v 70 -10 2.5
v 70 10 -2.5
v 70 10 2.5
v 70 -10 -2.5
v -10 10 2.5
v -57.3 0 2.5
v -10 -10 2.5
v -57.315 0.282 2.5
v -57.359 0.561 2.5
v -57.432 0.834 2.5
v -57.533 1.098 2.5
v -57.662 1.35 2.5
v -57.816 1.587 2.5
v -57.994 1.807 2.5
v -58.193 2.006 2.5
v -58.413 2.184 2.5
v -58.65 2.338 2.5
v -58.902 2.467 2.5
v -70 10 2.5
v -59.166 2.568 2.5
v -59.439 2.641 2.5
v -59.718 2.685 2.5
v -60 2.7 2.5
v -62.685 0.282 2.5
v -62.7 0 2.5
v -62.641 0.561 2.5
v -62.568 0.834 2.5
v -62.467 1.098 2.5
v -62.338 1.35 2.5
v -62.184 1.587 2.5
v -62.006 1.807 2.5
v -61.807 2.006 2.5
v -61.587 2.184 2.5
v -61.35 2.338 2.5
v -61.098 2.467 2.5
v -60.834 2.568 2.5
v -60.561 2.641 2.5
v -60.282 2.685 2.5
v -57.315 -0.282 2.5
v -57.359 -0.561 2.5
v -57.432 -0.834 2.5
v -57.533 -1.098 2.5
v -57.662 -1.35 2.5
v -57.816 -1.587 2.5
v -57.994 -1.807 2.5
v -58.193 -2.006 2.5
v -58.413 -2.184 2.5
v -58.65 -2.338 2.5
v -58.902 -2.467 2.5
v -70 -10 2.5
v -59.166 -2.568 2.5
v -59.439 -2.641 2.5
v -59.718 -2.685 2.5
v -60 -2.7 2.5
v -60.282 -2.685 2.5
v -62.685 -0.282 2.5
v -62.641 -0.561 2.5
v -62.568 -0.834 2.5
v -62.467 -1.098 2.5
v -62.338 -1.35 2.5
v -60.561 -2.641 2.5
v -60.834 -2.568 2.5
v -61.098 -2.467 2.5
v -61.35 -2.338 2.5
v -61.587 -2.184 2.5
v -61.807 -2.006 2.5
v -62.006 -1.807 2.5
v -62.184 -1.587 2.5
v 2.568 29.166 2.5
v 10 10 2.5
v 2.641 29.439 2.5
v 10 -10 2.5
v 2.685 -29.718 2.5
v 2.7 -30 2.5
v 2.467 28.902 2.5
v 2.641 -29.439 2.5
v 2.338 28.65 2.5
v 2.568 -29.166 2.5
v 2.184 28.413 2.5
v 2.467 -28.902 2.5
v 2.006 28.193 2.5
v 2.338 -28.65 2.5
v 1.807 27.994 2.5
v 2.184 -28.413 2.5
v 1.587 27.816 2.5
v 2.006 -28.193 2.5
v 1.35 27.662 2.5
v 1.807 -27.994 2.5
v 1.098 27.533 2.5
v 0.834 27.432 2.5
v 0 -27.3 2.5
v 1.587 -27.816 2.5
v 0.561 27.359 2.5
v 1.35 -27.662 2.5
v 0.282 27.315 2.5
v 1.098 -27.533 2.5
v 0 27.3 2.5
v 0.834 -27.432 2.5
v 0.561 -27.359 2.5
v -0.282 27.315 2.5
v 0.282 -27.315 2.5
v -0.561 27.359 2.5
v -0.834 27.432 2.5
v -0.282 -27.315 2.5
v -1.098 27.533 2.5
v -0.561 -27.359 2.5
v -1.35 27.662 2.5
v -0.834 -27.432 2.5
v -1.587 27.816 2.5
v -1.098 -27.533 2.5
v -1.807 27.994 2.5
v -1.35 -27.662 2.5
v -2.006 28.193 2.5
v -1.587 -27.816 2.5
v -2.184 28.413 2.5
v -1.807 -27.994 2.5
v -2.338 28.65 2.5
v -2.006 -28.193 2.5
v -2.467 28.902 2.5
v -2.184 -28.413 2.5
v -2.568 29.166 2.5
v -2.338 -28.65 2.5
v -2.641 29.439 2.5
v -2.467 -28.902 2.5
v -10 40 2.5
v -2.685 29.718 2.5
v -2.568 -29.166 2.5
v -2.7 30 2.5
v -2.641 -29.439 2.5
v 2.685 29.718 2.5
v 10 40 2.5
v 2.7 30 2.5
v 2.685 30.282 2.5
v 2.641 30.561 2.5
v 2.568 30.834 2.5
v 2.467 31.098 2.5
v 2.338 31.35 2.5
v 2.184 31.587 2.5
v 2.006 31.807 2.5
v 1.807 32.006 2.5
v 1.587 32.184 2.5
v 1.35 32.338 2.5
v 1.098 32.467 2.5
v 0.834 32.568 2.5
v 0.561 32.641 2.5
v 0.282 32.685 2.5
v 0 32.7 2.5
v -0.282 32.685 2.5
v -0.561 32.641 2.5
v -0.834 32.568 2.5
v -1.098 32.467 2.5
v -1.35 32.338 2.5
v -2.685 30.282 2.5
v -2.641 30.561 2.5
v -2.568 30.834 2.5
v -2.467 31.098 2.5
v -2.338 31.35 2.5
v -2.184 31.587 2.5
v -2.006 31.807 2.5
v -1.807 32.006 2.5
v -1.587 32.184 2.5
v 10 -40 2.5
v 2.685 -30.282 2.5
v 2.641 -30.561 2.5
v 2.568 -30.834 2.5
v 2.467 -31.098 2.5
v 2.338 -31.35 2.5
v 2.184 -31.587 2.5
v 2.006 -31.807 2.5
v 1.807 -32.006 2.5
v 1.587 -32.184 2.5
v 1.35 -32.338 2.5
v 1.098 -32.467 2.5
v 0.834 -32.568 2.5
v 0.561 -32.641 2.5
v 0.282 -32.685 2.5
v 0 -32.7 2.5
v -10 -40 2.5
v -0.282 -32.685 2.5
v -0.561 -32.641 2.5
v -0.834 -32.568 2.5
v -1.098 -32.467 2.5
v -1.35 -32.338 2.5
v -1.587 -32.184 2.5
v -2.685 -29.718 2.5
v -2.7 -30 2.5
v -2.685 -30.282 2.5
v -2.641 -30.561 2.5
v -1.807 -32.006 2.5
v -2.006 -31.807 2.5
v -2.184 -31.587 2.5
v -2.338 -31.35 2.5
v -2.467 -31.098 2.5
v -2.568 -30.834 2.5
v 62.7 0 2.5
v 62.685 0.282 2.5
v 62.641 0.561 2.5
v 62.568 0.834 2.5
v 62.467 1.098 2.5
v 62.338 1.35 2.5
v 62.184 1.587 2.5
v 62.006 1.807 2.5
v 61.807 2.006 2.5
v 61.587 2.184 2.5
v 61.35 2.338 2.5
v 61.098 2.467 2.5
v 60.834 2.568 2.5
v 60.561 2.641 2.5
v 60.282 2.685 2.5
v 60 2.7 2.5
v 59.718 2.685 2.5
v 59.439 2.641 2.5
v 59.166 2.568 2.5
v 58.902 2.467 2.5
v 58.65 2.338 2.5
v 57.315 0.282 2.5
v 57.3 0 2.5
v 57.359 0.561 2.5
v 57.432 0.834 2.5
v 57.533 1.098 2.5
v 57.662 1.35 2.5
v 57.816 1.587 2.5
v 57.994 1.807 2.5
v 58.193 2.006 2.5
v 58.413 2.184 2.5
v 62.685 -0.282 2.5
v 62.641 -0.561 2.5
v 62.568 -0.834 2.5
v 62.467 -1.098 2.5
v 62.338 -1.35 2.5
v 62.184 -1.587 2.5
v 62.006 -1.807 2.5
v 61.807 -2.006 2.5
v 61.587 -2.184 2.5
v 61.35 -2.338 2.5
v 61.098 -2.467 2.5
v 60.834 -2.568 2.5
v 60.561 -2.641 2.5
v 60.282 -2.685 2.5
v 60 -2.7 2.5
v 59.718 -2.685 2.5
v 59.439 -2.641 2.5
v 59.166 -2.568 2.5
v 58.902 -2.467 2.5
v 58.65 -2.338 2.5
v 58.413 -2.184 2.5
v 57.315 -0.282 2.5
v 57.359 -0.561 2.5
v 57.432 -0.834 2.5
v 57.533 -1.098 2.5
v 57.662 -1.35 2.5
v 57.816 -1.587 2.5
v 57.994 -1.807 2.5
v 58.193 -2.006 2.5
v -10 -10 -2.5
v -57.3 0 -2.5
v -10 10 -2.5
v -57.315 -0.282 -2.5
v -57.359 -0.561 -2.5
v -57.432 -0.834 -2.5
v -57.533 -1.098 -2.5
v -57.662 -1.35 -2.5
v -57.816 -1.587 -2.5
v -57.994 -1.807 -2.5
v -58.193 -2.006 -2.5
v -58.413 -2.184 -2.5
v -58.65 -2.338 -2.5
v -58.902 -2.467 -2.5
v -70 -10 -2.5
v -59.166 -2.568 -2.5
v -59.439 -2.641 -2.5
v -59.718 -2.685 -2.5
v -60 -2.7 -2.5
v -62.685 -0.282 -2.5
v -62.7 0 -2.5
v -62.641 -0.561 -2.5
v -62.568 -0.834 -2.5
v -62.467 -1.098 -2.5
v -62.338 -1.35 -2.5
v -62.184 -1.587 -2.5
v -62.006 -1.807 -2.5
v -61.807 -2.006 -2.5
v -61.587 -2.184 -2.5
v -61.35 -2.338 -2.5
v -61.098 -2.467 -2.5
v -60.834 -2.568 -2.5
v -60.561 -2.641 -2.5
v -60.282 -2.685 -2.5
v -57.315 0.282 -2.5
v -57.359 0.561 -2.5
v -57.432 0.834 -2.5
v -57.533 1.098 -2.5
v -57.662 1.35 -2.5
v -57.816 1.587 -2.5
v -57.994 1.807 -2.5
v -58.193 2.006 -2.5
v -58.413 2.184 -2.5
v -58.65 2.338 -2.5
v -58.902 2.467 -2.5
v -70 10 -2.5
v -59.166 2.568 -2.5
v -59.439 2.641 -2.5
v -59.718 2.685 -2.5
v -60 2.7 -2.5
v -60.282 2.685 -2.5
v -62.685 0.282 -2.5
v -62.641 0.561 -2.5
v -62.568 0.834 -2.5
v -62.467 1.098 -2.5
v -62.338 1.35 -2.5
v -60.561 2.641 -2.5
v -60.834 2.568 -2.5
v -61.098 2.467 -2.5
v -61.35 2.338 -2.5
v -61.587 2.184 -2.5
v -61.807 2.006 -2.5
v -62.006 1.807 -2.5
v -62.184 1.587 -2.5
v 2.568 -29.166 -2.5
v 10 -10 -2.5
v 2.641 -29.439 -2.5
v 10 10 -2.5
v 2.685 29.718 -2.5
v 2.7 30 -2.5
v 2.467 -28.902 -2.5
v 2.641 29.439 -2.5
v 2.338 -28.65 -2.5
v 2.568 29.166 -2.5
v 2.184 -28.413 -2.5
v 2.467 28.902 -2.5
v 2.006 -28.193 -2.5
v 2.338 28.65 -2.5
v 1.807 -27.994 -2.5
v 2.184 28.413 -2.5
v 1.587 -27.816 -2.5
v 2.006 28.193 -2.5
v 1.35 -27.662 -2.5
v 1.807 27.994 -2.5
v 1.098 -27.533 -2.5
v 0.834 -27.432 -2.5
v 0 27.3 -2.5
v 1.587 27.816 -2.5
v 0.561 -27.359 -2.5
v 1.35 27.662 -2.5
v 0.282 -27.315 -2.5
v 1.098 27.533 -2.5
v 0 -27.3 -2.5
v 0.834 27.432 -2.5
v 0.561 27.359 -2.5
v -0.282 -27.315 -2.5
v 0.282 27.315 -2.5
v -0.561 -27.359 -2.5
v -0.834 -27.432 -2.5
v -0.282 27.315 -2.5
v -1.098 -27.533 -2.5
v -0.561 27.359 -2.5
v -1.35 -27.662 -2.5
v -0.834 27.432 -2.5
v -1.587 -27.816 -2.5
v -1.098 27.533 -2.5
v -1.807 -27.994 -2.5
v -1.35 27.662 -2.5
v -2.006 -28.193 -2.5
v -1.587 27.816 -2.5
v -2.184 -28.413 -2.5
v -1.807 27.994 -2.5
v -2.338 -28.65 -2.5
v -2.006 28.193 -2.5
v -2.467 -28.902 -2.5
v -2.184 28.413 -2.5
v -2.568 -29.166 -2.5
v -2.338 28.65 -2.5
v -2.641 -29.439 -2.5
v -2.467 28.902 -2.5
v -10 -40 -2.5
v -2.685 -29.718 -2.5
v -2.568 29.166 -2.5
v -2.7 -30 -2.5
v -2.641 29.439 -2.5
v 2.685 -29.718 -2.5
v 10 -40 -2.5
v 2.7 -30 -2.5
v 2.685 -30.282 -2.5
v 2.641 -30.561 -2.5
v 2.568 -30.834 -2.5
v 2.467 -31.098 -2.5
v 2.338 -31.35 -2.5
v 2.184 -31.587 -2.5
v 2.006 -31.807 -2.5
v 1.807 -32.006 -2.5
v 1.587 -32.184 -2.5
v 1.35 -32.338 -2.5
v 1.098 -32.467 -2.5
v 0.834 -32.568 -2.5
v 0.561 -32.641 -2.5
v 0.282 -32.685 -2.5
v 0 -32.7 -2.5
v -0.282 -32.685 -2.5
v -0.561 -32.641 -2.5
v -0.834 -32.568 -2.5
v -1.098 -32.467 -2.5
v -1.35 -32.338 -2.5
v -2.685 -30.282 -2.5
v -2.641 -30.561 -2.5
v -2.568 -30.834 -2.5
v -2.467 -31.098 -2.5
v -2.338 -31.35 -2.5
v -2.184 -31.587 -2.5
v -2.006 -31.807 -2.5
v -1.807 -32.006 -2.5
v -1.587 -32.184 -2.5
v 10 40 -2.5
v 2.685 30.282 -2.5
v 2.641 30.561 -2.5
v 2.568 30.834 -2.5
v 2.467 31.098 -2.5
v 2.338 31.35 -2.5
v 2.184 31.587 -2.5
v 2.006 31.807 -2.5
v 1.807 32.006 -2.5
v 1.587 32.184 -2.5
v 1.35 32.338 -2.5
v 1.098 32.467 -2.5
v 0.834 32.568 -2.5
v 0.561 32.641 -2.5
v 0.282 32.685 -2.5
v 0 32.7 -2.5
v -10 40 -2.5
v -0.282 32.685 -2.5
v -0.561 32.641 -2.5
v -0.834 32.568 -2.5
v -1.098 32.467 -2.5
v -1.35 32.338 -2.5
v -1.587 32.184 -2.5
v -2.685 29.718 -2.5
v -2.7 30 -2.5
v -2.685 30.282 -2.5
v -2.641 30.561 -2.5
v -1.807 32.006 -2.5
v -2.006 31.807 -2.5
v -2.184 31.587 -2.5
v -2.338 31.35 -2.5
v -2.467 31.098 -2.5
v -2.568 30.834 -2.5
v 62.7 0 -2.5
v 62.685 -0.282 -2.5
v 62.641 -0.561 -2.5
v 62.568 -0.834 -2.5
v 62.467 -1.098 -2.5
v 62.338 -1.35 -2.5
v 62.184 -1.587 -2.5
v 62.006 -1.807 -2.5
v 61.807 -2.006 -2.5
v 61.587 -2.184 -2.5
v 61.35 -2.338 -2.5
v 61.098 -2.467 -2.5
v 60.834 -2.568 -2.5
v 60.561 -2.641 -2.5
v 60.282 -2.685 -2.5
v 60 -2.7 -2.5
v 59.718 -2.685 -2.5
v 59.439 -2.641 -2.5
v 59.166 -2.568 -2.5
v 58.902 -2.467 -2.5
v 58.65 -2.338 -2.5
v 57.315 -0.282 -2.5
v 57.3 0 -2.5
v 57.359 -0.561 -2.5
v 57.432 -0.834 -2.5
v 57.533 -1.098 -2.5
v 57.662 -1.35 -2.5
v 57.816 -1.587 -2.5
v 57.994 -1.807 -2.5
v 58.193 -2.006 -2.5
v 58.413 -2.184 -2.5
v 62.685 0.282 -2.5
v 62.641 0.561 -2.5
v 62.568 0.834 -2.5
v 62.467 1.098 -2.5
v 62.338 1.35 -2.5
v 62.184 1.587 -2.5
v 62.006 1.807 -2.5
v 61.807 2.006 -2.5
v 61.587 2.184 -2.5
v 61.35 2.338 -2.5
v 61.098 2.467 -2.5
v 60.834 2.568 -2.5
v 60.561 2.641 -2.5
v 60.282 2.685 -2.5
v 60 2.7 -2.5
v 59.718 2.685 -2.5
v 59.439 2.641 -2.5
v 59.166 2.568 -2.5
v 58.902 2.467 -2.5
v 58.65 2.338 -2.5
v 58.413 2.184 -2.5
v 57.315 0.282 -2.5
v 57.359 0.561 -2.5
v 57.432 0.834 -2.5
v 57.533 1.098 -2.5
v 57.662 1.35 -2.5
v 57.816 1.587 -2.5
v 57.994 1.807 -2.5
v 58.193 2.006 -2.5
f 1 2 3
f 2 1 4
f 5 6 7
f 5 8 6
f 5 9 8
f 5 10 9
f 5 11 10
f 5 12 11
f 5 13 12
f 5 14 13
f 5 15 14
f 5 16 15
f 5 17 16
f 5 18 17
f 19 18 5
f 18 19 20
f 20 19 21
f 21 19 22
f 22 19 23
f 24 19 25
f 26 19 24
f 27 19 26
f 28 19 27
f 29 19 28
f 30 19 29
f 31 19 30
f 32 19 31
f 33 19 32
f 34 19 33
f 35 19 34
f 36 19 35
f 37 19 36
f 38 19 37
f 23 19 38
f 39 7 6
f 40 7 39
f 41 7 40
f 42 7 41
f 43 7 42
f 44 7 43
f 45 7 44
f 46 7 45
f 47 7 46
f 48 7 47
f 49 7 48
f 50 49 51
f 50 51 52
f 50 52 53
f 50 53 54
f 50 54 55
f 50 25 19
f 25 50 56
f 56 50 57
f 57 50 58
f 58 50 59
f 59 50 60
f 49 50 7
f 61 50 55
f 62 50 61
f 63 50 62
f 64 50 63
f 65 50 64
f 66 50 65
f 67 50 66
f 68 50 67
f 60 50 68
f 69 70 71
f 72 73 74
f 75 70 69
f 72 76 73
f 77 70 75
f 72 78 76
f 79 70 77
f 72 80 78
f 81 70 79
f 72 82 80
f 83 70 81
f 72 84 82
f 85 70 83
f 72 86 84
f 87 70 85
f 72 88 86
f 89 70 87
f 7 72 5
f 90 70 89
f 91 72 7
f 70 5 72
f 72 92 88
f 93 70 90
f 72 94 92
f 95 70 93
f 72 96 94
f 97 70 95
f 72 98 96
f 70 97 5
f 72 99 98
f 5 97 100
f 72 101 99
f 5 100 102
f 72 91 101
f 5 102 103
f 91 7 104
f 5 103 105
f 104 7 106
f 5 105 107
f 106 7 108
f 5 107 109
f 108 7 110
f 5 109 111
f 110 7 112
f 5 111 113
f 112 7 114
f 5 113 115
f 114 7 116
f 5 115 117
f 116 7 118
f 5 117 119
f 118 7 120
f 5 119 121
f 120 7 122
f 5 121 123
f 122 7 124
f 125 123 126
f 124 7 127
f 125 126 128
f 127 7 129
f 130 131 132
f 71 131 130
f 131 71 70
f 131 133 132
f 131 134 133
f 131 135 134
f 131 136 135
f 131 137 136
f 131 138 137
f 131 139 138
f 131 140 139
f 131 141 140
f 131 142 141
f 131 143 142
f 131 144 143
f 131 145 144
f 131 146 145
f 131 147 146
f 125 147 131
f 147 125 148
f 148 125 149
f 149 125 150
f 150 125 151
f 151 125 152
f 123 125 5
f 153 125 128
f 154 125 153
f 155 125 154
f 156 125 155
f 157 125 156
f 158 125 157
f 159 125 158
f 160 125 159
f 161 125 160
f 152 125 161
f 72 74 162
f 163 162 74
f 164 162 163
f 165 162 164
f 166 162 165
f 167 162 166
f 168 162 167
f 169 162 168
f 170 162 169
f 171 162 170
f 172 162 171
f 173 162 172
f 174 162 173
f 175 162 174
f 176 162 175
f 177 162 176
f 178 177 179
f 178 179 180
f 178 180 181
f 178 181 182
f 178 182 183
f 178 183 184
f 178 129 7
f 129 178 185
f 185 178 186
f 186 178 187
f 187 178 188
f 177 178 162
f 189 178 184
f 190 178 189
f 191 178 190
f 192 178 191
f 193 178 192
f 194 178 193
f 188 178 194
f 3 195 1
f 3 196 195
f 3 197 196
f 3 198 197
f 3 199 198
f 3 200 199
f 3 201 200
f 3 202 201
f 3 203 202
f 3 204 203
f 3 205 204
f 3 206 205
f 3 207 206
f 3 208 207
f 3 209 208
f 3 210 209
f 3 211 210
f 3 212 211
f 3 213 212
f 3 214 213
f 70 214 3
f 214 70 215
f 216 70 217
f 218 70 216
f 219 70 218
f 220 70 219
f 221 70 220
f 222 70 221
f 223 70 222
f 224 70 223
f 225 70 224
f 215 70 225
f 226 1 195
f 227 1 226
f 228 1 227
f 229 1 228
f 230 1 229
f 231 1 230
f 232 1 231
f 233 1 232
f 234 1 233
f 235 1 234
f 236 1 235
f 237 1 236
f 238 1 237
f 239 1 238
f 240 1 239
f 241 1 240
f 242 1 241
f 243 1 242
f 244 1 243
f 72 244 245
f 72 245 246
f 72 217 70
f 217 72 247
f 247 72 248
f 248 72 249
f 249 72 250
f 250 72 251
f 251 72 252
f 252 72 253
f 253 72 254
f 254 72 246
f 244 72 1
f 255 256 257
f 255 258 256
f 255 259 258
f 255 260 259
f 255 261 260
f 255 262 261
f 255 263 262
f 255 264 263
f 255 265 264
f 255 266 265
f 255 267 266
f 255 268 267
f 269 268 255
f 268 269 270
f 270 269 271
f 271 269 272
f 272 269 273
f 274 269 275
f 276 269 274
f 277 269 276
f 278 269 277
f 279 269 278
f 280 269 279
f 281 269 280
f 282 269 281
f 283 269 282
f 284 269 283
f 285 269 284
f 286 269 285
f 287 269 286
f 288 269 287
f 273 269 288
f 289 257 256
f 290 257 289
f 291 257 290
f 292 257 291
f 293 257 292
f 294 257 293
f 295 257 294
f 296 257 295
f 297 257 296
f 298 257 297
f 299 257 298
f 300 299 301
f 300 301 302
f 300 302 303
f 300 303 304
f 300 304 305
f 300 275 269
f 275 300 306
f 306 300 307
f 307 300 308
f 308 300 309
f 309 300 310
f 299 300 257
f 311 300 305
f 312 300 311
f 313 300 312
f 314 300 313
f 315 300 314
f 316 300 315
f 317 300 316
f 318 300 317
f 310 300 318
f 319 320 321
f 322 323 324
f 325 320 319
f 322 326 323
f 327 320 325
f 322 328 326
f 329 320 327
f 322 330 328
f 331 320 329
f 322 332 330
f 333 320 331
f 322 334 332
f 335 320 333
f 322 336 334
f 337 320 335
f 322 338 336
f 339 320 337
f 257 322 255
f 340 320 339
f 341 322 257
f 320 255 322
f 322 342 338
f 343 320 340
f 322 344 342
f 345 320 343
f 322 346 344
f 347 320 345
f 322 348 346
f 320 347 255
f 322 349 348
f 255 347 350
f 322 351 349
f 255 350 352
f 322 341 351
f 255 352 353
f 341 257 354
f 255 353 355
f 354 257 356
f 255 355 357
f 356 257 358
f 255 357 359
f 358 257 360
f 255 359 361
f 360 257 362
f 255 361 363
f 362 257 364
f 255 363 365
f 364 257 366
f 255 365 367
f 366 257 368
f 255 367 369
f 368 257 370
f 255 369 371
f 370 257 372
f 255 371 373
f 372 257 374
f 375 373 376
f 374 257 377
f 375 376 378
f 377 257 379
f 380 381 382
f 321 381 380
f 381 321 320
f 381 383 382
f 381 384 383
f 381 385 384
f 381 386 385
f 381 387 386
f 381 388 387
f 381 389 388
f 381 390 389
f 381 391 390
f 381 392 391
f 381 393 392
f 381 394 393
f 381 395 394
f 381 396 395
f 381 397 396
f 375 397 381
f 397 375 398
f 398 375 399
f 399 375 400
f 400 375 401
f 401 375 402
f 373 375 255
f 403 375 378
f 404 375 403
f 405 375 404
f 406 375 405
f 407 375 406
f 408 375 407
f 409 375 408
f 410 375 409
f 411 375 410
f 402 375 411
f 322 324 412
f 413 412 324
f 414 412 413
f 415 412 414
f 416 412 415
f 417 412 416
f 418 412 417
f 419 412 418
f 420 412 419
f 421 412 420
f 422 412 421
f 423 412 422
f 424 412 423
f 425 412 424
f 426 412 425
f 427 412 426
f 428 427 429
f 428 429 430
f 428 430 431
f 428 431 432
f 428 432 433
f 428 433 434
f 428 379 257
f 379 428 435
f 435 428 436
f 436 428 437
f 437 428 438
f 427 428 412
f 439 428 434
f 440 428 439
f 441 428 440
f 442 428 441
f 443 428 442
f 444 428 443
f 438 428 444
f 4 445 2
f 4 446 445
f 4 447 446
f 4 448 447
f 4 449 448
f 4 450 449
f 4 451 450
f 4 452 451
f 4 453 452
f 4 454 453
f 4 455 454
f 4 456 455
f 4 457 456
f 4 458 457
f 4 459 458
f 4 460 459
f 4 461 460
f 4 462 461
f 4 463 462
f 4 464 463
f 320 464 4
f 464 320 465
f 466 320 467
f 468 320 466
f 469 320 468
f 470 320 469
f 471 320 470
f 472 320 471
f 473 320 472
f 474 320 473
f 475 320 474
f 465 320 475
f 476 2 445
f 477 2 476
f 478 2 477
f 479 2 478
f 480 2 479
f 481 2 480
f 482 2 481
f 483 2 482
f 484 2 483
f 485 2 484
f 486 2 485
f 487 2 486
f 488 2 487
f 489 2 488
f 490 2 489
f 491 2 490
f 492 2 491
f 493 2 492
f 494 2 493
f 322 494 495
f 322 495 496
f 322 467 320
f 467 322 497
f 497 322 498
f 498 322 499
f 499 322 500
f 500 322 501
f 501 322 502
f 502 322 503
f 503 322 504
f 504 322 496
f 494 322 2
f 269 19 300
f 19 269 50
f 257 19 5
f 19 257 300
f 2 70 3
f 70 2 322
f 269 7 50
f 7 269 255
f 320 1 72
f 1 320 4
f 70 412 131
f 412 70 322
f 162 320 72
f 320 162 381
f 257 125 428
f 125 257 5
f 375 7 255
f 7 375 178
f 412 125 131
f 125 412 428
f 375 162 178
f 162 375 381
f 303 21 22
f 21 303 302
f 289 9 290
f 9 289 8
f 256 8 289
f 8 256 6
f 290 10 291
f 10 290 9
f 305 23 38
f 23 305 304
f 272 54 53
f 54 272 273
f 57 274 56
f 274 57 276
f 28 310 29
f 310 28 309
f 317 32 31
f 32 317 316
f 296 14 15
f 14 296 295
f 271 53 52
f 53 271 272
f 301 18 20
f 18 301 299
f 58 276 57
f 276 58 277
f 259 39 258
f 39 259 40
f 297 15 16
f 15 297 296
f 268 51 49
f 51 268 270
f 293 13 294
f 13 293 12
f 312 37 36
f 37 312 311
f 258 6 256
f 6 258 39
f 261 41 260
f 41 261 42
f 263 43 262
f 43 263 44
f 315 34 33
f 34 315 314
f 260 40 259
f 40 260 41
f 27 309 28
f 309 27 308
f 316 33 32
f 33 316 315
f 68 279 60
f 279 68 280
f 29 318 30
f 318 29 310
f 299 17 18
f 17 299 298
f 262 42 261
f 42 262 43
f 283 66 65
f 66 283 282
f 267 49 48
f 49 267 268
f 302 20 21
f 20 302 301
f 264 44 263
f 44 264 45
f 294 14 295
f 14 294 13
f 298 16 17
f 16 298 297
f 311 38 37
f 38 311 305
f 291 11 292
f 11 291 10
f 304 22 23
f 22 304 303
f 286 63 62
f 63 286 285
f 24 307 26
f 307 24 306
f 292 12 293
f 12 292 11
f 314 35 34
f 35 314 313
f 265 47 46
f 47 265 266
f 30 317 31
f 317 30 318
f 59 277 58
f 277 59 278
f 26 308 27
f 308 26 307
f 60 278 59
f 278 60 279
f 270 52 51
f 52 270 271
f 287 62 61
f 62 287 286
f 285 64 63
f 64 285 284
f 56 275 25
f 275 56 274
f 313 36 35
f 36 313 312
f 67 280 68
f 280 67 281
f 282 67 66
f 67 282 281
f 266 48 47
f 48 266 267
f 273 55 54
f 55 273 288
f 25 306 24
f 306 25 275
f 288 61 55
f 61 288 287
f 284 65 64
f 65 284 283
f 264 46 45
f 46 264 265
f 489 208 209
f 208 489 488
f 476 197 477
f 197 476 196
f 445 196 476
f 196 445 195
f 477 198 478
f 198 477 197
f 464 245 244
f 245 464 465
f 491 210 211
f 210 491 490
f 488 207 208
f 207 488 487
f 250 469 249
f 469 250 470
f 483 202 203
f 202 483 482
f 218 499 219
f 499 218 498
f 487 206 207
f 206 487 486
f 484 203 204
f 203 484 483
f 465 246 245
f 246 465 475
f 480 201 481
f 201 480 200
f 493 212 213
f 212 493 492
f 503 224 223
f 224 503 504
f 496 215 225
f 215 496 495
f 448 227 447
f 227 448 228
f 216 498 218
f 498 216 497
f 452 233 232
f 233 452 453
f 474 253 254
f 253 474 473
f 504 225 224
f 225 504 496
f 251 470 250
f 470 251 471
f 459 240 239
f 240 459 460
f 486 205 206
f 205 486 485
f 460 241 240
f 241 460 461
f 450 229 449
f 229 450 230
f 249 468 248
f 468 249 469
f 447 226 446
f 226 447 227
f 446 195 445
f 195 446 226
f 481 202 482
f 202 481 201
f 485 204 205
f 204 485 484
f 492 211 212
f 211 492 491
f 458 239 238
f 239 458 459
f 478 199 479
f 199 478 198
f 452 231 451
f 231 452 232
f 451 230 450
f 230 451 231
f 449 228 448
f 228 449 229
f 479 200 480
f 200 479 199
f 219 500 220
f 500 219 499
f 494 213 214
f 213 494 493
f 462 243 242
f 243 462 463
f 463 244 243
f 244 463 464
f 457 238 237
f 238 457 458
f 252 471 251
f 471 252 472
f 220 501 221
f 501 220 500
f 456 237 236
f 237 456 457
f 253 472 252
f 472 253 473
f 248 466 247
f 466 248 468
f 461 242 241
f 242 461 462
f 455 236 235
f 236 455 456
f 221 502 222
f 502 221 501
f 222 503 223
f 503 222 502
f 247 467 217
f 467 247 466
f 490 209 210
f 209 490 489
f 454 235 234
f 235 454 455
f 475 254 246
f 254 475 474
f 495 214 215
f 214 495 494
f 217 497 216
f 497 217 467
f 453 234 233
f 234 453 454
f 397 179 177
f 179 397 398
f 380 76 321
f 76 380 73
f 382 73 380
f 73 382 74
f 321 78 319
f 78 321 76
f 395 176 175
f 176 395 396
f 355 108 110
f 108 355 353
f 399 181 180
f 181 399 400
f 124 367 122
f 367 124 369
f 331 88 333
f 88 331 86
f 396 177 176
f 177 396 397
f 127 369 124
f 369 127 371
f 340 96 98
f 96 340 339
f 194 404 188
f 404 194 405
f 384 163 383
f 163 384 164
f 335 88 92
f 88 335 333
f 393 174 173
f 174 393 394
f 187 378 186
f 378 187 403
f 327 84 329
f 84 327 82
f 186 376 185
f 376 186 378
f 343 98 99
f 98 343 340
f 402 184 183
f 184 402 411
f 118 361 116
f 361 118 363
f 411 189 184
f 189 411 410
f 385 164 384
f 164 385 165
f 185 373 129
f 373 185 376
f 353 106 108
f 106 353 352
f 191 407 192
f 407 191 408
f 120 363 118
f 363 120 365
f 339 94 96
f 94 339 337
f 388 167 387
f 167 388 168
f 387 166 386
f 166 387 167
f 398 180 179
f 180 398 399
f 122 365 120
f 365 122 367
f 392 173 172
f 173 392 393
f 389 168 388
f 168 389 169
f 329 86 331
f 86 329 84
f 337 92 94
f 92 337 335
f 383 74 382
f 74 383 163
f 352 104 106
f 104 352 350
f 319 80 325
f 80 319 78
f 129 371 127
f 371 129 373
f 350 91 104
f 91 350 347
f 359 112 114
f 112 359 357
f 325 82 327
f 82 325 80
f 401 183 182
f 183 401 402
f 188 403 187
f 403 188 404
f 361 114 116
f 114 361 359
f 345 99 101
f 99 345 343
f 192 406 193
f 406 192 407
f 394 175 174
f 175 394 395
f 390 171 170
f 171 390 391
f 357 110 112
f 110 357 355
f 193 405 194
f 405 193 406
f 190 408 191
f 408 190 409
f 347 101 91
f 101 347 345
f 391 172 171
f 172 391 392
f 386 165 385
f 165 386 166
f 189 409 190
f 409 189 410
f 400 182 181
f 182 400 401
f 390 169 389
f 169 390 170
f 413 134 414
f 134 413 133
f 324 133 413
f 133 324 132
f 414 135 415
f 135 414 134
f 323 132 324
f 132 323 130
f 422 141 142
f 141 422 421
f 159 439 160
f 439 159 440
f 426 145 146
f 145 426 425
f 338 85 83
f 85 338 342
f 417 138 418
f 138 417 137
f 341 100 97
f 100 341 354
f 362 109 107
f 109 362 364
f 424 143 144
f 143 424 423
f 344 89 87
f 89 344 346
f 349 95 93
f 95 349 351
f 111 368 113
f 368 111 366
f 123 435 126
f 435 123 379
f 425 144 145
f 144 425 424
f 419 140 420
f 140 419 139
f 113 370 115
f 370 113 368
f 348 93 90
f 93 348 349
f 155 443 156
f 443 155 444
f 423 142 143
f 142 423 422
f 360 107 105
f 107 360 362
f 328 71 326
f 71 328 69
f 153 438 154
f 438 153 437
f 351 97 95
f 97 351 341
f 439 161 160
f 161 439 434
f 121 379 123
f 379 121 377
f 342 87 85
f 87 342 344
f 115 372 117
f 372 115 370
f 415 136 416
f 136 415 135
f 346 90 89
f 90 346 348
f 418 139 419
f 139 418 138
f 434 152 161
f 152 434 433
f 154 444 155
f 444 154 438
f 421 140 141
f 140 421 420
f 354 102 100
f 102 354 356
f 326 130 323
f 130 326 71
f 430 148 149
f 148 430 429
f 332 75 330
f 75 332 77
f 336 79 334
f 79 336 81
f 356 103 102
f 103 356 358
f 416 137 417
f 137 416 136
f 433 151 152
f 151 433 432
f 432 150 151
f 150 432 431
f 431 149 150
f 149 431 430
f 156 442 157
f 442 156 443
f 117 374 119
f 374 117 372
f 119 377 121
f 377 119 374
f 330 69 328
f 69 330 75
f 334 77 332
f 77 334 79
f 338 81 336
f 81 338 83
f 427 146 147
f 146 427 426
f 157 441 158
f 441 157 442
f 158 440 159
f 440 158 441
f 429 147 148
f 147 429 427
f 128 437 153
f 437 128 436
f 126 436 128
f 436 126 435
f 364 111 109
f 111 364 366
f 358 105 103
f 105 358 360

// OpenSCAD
// T-shaped mounting plate.
$fn = 60;
eps = 0.02;
stem_l = 140;
arm_l = 80;
width = 20;
thickness = 5;
difference() {
    union() { cube([stem_l,width,thickness],center=true); cube([width,arm_l,thickness],center=true); }
    for (p=[[-stem_l/2+10,0],[stem_l/2-10,0],[0,-arm_l/2+10],[0,arm_l/2-10]]) translate([p[0],p[1],-thickness/2-eps]) cylinder(d=5.4,h=thickness+2*eps);
}
